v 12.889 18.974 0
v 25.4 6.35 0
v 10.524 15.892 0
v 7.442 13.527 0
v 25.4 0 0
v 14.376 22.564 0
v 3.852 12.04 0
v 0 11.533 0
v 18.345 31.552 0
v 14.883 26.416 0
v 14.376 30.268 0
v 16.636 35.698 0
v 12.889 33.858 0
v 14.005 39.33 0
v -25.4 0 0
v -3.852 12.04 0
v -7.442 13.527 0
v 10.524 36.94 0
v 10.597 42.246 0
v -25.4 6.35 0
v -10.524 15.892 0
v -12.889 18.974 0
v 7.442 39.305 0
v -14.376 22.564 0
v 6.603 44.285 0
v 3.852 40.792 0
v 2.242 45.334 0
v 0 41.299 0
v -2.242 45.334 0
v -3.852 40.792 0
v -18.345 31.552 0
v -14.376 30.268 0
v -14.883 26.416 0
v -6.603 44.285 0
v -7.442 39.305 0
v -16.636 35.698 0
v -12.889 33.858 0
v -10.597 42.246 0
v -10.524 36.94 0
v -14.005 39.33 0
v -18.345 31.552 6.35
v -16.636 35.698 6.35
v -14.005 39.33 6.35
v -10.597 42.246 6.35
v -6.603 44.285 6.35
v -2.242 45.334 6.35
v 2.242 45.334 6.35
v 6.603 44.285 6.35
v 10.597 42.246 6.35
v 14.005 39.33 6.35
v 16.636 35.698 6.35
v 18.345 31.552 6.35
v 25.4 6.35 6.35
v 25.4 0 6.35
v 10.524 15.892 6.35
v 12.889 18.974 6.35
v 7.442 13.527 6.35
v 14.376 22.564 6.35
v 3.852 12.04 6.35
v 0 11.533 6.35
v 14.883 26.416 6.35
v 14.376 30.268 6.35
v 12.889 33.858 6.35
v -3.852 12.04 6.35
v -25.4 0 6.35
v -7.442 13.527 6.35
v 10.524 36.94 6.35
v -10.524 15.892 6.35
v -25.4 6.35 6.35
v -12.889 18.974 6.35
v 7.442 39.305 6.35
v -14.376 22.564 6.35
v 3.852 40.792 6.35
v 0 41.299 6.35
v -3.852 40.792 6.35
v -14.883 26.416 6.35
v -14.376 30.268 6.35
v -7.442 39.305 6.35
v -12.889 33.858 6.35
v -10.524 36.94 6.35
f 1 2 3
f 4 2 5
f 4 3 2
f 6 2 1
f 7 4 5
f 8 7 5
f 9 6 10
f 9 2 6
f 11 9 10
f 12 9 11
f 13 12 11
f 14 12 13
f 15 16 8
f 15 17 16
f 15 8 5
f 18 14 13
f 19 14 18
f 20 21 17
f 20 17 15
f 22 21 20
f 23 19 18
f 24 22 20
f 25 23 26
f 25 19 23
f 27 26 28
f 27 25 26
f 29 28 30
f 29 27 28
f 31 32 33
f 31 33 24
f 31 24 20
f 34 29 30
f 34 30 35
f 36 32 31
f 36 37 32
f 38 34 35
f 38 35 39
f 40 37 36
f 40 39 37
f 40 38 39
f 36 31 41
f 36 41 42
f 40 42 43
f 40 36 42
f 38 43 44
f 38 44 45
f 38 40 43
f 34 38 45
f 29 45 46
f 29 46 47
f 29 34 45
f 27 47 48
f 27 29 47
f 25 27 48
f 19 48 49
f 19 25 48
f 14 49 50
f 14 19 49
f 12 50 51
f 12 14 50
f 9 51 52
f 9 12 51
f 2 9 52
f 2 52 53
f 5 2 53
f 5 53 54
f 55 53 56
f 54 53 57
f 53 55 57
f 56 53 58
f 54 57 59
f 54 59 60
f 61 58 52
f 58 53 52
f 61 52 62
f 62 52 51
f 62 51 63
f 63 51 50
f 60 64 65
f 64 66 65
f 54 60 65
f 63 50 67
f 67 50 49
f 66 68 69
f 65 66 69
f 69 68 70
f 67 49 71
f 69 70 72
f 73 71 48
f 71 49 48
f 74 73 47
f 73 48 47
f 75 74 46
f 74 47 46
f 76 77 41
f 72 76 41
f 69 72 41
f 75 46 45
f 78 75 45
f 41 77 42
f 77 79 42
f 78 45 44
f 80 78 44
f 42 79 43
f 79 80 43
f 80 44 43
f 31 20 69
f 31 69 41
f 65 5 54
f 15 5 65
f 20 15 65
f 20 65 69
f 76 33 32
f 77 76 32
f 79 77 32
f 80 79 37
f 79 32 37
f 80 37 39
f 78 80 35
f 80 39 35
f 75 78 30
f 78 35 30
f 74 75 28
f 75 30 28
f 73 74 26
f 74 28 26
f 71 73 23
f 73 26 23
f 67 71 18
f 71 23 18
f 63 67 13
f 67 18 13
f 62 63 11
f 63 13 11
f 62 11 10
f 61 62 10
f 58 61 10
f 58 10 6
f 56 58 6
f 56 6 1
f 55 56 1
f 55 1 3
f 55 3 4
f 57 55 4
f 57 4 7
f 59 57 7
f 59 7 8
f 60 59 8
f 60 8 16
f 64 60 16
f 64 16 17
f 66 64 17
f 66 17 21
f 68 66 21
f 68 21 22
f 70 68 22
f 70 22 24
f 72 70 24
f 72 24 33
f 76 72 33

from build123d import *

# Parameters (mm, degrees)
BOSS_EXTRUDE1_DEPTH           = 6.35
F_1_1_4_12_TAPPED_HOLE1_D     = 29.76626
F_1_1_4_12_TAPPED_HOLE1_DEPTH = 74.0791
F_1_1_4_12_TAPPED_HOLE1_TIP   = 8.942686705


with BuildPart() as part:
    # Sketch1 → Boss-Extrude1 (new body)
    with BuildSketch(Plane.XY):
        with BuildLine():
            Line((0, 0), (-25.4, 0))
            Line((-25.4, 0), (-25.4, 6.35))
            Line((-25.4, 6.35), (-18.344682017, 31.55167344))
            ThreePointArc((-18.344682017, 31.55167344), (0, 45.466), (18.344682017, 31.55167344))
            Line((18.344682017, 31.55167344), (25.4, 6.35))
            Line((25.4, 6.35), (25.4, 0))
            Line((25.4, 0), (0, 0))
        make_face()
    extrude(amount=BOSS_EXTRUDE1_DEPTH)

    # 1-1/4-12 Tapped Hole1
    with Locations(Plane(origin=(0, 26.416, 6.35), x_dir=(1, 0, 0), z_dir=(0, 0, 1))):
        with Locations((0, 0)):
            Hole(F_1_1_4_12_TAPPED_HOLE1_D / 2, depth=F_1_1_4_12_TAPPED_HOLE1_DEPTH)
            with Locations((0, 0, -(F_1_1_4_12_TAPPED_HOLE1_DEPTH + F_1_1_4_12_TAPPED_HOLE1_TIP / 2))):  # 118° drill point
                Cone(0, F_1_1_4_12_TAPPED_HOLE1_D / 2, F_1_1_4_12_TAPPED_HOLE1_TIP, mode=Mode.SUBTRACT)


solid = part.part
